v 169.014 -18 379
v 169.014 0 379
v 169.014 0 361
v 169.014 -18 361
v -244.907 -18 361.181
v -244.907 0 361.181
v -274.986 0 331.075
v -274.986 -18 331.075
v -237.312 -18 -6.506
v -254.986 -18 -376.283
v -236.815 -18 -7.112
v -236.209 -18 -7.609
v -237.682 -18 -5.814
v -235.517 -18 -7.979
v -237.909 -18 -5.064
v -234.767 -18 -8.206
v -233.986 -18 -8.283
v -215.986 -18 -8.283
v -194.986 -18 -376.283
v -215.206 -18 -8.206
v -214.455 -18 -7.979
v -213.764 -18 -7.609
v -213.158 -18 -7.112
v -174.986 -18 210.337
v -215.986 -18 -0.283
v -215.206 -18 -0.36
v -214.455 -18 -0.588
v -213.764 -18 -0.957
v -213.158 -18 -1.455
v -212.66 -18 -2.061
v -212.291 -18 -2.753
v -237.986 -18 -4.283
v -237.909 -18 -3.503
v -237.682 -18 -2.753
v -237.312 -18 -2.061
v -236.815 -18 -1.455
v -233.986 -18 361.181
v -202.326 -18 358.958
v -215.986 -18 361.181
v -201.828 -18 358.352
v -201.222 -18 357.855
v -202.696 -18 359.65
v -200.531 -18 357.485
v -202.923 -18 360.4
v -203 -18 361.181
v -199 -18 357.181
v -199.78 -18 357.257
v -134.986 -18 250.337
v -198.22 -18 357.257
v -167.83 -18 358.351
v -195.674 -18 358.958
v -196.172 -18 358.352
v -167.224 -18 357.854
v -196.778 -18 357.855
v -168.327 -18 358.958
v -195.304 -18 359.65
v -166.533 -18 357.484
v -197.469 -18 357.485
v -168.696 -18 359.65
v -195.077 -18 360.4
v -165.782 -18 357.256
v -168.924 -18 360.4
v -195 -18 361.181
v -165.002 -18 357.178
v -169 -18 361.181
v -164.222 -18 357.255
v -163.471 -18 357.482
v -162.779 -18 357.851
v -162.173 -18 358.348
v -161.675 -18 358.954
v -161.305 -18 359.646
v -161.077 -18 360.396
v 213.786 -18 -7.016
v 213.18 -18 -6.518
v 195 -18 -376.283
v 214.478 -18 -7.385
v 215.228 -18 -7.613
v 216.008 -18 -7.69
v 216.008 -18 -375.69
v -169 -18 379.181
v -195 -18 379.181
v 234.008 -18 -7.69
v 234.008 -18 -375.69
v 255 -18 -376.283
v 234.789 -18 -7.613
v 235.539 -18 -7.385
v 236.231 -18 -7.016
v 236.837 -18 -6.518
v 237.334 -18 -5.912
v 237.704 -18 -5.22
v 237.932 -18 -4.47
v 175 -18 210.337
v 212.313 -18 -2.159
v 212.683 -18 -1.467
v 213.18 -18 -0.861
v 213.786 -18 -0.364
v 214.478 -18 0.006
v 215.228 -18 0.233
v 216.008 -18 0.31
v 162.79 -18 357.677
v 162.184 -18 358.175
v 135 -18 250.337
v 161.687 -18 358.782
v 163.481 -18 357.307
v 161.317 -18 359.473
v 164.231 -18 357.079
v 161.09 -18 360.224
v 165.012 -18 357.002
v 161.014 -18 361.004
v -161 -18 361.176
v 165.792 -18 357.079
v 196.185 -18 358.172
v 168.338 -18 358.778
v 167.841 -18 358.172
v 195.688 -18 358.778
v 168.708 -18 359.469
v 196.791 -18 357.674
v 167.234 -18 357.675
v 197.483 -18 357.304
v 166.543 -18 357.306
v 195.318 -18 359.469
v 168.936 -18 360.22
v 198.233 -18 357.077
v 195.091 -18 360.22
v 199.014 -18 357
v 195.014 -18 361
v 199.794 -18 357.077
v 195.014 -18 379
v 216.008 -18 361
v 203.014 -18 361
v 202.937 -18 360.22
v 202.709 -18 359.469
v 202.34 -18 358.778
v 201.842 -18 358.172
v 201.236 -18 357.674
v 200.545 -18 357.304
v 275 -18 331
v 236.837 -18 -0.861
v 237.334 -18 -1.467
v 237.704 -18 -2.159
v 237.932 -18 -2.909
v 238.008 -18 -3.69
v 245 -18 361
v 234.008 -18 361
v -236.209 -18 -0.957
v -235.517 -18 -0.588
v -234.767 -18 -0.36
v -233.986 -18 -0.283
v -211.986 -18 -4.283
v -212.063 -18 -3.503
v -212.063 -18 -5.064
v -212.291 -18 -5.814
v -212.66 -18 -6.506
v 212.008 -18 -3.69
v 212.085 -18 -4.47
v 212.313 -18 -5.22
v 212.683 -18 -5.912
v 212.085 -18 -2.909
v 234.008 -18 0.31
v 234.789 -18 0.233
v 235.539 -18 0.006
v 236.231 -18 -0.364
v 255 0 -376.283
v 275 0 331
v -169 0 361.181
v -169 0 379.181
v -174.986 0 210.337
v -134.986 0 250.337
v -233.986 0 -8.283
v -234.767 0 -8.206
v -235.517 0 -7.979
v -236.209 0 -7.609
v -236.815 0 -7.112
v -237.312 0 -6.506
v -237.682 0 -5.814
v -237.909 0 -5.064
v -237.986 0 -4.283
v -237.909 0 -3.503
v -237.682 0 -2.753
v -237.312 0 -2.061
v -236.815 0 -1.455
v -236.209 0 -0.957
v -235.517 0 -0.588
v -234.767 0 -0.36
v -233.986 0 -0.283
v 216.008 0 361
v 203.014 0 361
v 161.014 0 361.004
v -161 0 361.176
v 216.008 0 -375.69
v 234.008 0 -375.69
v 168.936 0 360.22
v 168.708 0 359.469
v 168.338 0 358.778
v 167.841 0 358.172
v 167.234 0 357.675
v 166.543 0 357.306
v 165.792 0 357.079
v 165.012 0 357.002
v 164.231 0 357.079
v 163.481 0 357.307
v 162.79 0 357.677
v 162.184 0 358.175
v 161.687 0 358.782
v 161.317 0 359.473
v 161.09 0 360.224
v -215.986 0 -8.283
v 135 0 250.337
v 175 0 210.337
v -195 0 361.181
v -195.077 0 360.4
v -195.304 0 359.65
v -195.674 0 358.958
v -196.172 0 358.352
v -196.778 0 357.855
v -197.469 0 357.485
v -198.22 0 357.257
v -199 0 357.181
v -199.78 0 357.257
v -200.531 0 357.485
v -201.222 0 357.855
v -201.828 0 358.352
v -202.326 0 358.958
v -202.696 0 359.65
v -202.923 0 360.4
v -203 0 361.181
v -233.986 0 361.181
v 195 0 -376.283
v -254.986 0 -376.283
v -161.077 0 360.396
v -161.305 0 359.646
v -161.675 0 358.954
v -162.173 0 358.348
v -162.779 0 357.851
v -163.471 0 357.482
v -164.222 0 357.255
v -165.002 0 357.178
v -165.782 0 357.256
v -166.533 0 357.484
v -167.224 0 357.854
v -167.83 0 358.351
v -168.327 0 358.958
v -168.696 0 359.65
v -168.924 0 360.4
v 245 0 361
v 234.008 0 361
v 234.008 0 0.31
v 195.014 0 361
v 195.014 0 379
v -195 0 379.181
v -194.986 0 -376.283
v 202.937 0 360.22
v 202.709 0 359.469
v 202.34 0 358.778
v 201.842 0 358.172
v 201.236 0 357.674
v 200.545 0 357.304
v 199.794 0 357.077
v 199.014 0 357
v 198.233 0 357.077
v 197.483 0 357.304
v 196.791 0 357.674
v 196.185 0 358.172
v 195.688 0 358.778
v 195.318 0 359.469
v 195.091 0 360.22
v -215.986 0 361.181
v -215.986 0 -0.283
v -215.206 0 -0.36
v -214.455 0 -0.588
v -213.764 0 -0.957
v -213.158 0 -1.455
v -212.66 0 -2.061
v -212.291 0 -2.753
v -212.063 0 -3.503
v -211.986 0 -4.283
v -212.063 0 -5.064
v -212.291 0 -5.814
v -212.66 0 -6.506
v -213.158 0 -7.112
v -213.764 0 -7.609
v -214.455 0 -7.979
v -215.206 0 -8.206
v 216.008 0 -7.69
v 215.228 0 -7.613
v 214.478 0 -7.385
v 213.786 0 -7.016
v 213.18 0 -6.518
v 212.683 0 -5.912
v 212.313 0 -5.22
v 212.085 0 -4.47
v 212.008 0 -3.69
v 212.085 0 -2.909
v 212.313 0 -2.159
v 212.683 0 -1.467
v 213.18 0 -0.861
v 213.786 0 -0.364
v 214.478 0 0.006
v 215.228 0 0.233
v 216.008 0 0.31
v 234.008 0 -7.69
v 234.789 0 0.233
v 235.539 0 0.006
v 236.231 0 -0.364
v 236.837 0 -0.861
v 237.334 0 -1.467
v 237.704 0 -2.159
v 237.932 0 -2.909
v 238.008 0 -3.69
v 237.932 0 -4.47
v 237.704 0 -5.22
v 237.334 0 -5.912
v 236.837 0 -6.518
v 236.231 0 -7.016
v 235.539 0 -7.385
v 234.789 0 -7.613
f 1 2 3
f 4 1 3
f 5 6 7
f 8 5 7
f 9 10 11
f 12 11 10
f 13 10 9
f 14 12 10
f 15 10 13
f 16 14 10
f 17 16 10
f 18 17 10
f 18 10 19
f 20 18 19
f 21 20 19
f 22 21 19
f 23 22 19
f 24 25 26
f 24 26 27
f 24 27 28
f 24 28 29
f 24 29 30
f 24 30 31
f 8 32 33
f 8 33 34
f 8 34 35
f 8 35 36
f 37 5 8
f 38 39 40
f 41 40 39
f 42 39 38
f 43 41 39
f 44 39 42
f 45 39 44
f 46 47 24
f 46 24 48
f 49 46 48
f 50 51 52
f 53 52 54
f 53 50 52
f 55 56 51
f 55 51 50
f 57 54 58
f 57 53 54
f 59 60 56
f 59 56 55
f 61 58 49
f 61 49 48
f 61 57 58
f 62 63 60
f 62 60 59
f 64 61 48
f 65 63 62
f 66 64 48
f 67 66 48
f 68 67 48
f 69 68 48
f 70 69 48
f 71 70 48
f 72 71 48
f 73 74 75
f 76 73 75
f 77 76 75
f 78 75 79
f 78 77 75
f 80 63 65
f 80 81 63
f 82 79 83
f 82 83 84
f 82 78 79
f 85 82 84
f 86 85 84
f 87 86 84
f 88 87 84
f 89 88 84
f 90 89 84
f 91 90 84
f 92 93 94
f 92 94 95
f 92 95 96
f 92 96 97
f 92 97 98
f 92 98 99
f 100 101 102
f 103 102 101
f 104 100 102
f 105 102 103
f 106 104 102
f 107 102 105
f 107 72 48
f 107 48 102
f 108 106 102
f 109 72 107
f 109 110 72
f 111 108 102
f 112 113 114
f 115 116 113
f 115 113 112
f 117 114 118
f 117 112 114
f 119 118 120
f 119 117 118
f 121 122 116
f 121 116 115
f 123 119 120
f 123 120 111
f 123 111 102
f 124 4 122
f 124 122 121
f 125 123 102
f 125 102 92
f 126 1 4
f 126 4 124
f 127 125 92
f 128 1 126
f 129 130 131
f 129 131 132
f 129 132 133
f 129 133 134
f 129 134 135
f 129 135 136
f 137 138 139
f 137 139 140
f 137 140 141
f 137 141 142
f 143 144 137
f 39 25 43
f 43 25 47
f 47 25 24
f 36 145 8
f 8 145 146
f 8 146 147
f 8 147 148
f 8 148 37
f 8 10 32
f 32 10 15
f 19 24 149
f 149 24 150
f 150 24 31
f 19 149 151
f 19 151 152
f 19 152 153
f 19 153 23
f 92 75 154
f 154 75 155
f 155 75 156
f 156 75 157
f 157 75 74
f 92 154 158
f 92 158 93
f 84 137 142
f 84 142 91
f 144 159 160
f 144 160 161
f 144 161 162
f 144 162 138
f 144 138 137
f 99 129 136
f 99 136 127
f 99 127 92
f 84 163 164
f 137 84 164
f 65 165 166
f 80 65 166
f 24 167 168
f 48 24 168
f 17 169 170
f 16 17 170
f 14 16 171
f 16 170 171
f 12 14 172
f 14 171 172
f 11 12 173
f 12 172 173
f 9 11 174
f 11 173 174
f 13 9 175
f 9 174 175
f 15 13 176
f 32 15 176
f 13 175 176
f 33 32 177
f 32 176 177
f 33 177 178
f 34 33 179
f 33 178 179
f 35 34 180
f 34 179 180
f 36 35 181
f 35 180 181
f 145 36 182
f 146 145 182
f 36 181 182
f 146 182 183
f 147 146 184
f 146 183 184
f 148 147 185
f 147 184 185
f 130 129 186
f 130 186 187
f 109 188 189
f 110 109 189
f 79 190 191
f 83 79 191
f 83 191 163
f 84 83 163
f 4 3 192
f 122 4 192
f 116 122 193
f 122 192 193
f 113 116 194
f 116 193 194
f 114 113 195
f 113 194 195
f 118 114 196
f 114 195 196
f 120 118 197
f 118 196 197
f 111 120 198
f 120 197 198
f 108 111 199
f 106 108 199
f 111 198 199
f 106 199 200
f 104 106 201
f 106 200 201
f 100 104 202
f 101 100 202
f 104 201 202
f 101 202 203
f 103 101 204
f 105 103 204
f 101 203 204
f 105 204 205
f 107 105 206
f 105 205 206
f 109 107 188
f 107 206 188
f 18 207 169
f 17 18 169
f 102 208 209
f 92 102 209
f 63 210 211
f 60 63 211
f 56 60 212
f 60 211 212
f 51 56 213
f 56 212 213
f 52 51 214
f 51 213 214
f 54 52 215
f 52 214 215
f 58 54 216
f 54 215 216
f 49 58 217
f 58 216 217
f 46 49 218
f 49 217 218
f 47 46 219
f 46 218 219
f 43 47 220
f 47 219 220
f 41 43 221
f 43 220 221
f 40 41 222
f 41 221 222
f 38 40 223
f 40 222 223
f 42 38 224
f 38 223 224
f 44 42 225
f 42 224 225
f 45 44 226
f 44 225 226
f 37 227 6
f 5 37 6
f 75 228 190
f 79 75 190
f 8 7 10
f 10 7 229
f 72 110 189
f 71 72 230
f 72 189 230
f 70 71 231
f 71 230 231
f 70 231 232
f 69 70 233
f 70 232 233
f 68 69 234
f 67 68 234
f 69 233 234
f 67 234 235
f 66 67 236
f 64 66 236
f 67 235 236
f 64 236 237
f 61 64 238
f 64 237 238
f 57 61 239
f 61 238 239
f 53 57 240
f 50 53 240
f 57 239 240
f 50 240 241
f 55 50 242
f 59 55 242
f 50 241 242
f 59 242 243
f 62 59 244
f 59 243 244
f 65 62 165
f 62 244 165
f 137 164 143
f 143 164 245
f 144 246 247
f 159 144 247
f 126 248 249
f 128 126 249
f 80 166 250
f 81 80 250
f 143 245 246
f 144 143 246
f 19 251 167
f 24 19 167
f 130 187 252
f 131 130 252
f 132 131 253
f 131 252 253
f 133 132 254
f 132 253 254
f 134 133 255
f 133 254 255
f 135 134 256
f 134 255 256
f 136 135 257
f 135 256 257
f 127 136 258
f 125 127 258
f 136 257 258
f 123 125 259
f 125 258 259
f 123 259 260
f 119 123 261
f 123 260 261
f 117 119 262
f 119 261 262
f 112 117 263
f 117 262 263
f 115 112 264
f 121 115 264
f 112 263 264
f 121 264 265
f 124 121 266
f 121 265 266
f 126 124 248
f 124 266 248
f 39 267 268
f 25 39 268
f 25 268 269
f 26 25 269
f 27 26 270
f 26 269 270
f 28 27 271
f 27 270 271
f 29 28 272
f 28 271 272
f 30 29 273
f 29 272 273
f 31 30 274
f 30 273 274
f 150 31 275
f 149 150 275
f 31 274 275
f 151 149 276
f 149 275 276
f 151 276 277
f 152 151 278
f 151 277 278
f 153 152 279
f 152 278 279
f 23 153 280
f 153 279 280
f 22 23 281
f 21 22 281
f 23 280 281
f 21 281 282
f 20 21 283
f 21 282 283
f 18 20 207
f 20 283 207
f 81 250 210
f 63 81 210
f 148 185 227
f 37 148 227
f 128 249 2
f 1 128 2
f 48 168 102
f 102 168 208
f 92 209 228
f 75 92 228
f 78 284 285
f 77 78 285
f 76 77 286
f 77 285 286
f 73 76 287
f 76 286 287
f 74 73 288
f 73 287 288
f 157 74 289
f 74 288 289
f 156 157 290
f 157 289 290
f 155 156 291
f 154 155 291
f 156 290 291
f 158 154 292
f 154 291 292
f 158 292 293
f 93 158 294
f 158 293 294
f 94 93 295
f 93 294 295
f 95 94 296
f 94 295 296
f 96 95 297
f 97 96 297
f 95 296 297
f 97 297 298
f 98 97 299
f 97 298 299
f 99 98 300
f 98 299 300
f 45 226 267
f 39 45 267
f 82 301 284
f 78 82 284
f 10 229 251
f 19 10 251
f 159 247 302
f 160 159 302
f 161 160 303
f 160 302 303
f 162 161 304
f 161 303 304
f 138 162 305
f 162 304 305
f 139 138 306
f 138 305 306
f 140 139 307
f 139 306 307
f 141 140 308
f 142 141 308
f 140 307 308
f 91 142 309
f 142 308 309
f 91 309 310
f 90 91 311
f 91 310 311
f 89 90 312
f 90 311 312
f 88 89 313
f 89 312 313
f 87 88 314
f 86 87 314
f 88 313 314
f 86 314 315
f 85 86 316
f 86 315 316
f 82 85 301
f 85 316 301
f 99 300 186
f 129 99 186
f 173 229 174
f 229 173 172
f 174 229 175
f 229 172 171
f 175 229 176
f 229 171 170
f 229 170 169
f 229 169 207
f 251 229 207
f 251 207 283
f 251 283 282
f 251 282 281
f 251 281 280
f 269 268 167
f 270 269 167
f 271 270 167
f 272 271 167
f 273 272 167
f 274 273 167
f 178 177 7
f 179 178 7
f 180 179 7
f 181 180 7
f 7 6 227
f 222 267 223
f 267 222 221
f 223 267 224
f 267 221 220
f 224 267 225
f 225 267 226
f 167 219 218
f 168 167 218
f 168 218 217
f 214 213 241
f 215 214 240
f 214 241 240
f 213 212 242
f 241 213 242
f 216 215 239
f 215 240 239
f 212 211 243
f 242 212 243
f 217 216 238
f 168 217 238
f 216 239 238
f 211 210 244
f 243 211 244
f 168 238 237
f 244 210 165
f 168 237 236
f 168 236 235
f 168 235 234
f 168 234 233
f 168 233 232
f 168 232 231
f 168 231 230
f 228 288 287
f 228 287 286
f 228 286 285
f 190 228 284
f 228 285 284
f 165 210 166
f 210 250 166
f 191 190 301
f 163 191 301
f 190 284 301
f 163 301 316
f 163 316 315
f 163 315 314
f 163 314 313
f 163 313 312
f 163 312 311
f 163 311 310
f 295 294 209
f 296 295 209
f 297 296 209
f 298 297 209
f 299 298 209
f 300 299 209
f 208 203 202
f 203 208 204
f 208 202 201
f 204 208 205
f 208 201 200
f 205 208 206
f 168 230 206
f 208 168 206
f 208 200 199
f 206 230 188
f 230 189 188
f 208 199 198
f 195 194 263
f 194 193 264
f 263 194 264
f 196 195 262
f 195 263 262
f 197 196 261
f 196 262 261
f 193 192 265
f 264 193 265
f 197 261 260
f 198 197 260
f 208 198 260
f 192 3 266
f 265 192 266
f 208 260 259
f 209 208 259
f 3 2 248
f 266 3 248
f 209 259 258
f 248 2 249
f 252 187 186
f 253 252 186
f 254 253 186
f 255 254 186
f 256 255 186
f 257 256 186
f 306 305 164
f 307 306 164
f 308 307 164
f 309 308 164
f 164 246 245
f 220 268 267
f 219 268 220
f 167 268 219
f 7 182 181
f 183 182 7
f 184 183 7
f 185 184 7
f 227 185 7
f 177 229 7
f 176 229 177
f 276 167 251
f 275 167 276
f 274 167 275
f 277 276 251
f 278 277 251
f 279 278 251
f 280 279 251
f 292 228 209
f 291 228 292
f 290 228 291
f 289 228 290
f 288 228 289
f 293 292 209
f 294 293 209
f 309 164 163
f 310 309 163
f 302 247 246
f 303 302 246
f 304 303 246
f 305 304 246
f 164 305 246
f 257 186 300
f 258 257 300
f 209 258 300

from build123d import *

# Parameters (mm, degrees)
F1_DEPTH = 18


# Not quite as in the source:
# - ends of sketch curves that miss each other by under 0.0002 mm in the source are joined


with BuildPart() as f1:
    # F0 (on Front) → F1 (new body)
    with BuildSketch(Plane.XZ):
        with BuildLine():
            Line((195.0137715405, 361), (195.0137715405, 379))
            Line((195.0137715405, 379), (169.0137715405, 379))
            Line((169.0137715405, 379), (169.0137715405, 361.0021361967))
            Line((169.0137715405, 361.0021361967), (169.0137715405, 361))
            ThreePointArc((169.0137715405, 361), (165.0116353441, 357.0021367671), (161.0137721109, 361.0042723931))
            Line((161.0137721109, 361.0042723931), (-161.0000017113, 361.1762435819))
            ThreePointArc((-161.0000017113, 361.1762435819), (-165.0021373372, 357.1783803487), (-169.0000005704, 361.1805159746))
            Line((-169.0000005704, 361.1805159746), (-169.0000005704, 379.1805159746))
            Line((-169.0000005704, 379.1805159746), (-195.0000005704, 379.1805159746))
            Line((-195.0000005704, 379.1805159746), (-195.0000005704, 361.1805160001))
            ThreePointArc((-195.0000005704, 361.1805160001), (-199, 357.1805165706), (-202.9999994296, 361.1805160001))
            Line((-202.9999994296, 361.1805160001), (-215.9862284595, 361.1805160001))
            Line((-215.9862284595, 361.1805160001), (-215.9862284595, -0.2833213137))
            ThreePointArc((-215.9862284595, -0.2833213137), (-211.9862284595, -4.2833213137), (-215.9862284595, -8.2833213137))
            Line((-215.9862284595, -8.2833213137), (-233.9862284595, -8.2833213137))
            ThreePointArc((-233.9862284595, -8.2833213137), (-237.9862284595, -4.2833213137), (-233.9862284595, -0.2833213137))
            Line((-233.9862284595, -0.2833213137), (-233.9862284595, 361.1805160001))
            Line((-233.9862284595, 361.1805160001), (-244.90749278, 361.1805160001))
            Line((-244.90749278, 361.1805160001), (-274.9862284595, 331.0746893941))
            Line((-274.9862284595, 331.0746893941), (-254.9862284595, -376.2833213137))
            Line((-254.9862284595, -376.2833213137), (-233.9862284595, -376.2833213137))
            Line((-233.9862284595, -376.2833213137), (-215.9862284595, -376.2833213137))
            Line((-215.9862284595, -376.2833213137), (-194.9862284595, -376.2833213137))
            Line((-194.9862284595, -376.2833213137), (-174.9862284595, 210.3365797868))
            Line((-174.9862284595, 210.3365797868), (-134.9862284595, 250.3365797868))
            Line((-134.9862284595, 250.3365797868), (135, 250.3365797868))
            Line((135, 250.3365797868), (175, 210.3365797868))
            Line((175, 210.3365797868), (195, -376.2833213137))
            Line((195, -376.2833213137), (216.0083907756, -375.6897371419))
            Line((216.0083907756, -375.6897371419), (234.0083907756, -375.6897371419))
            Line((234.0083907756, -375.6897371419), (255, -376.2833213137))
            Line((255, -376.2833213137), (275, 331))
            Line((275, 331), (245, 361))
            Line((245, 361), (234.0083907756, 361))
            Line((234.0083907756, 361), (234.0083907756, 0.3102628581))
            ThreePointArc((234.0083907756, 0.3102628581), (238.0083907756, -3.6897371419), (234.0083907756, -7.6897371419))
            Line((234.0083907756, -7.6897371419), (216.0083907756, -7.6897371419))
            ThreePointArc((216.0083907756, -7.6897371419), (212.0083907756, -3.6897371419), (216.0083907756, 0.3102628581))
            Line((216.0083907756, 0.3102628581), (216.0083907756, 361))
            Line((216.0083907756, 361), (203.0137715405, 361))
            ThreePointArc((203.0137715405, 361), (199.0137715405, 357), (195.0137715405, 361))
        make_face()
    extrude(amount=F1_DEPTH)


solid = f1.part
